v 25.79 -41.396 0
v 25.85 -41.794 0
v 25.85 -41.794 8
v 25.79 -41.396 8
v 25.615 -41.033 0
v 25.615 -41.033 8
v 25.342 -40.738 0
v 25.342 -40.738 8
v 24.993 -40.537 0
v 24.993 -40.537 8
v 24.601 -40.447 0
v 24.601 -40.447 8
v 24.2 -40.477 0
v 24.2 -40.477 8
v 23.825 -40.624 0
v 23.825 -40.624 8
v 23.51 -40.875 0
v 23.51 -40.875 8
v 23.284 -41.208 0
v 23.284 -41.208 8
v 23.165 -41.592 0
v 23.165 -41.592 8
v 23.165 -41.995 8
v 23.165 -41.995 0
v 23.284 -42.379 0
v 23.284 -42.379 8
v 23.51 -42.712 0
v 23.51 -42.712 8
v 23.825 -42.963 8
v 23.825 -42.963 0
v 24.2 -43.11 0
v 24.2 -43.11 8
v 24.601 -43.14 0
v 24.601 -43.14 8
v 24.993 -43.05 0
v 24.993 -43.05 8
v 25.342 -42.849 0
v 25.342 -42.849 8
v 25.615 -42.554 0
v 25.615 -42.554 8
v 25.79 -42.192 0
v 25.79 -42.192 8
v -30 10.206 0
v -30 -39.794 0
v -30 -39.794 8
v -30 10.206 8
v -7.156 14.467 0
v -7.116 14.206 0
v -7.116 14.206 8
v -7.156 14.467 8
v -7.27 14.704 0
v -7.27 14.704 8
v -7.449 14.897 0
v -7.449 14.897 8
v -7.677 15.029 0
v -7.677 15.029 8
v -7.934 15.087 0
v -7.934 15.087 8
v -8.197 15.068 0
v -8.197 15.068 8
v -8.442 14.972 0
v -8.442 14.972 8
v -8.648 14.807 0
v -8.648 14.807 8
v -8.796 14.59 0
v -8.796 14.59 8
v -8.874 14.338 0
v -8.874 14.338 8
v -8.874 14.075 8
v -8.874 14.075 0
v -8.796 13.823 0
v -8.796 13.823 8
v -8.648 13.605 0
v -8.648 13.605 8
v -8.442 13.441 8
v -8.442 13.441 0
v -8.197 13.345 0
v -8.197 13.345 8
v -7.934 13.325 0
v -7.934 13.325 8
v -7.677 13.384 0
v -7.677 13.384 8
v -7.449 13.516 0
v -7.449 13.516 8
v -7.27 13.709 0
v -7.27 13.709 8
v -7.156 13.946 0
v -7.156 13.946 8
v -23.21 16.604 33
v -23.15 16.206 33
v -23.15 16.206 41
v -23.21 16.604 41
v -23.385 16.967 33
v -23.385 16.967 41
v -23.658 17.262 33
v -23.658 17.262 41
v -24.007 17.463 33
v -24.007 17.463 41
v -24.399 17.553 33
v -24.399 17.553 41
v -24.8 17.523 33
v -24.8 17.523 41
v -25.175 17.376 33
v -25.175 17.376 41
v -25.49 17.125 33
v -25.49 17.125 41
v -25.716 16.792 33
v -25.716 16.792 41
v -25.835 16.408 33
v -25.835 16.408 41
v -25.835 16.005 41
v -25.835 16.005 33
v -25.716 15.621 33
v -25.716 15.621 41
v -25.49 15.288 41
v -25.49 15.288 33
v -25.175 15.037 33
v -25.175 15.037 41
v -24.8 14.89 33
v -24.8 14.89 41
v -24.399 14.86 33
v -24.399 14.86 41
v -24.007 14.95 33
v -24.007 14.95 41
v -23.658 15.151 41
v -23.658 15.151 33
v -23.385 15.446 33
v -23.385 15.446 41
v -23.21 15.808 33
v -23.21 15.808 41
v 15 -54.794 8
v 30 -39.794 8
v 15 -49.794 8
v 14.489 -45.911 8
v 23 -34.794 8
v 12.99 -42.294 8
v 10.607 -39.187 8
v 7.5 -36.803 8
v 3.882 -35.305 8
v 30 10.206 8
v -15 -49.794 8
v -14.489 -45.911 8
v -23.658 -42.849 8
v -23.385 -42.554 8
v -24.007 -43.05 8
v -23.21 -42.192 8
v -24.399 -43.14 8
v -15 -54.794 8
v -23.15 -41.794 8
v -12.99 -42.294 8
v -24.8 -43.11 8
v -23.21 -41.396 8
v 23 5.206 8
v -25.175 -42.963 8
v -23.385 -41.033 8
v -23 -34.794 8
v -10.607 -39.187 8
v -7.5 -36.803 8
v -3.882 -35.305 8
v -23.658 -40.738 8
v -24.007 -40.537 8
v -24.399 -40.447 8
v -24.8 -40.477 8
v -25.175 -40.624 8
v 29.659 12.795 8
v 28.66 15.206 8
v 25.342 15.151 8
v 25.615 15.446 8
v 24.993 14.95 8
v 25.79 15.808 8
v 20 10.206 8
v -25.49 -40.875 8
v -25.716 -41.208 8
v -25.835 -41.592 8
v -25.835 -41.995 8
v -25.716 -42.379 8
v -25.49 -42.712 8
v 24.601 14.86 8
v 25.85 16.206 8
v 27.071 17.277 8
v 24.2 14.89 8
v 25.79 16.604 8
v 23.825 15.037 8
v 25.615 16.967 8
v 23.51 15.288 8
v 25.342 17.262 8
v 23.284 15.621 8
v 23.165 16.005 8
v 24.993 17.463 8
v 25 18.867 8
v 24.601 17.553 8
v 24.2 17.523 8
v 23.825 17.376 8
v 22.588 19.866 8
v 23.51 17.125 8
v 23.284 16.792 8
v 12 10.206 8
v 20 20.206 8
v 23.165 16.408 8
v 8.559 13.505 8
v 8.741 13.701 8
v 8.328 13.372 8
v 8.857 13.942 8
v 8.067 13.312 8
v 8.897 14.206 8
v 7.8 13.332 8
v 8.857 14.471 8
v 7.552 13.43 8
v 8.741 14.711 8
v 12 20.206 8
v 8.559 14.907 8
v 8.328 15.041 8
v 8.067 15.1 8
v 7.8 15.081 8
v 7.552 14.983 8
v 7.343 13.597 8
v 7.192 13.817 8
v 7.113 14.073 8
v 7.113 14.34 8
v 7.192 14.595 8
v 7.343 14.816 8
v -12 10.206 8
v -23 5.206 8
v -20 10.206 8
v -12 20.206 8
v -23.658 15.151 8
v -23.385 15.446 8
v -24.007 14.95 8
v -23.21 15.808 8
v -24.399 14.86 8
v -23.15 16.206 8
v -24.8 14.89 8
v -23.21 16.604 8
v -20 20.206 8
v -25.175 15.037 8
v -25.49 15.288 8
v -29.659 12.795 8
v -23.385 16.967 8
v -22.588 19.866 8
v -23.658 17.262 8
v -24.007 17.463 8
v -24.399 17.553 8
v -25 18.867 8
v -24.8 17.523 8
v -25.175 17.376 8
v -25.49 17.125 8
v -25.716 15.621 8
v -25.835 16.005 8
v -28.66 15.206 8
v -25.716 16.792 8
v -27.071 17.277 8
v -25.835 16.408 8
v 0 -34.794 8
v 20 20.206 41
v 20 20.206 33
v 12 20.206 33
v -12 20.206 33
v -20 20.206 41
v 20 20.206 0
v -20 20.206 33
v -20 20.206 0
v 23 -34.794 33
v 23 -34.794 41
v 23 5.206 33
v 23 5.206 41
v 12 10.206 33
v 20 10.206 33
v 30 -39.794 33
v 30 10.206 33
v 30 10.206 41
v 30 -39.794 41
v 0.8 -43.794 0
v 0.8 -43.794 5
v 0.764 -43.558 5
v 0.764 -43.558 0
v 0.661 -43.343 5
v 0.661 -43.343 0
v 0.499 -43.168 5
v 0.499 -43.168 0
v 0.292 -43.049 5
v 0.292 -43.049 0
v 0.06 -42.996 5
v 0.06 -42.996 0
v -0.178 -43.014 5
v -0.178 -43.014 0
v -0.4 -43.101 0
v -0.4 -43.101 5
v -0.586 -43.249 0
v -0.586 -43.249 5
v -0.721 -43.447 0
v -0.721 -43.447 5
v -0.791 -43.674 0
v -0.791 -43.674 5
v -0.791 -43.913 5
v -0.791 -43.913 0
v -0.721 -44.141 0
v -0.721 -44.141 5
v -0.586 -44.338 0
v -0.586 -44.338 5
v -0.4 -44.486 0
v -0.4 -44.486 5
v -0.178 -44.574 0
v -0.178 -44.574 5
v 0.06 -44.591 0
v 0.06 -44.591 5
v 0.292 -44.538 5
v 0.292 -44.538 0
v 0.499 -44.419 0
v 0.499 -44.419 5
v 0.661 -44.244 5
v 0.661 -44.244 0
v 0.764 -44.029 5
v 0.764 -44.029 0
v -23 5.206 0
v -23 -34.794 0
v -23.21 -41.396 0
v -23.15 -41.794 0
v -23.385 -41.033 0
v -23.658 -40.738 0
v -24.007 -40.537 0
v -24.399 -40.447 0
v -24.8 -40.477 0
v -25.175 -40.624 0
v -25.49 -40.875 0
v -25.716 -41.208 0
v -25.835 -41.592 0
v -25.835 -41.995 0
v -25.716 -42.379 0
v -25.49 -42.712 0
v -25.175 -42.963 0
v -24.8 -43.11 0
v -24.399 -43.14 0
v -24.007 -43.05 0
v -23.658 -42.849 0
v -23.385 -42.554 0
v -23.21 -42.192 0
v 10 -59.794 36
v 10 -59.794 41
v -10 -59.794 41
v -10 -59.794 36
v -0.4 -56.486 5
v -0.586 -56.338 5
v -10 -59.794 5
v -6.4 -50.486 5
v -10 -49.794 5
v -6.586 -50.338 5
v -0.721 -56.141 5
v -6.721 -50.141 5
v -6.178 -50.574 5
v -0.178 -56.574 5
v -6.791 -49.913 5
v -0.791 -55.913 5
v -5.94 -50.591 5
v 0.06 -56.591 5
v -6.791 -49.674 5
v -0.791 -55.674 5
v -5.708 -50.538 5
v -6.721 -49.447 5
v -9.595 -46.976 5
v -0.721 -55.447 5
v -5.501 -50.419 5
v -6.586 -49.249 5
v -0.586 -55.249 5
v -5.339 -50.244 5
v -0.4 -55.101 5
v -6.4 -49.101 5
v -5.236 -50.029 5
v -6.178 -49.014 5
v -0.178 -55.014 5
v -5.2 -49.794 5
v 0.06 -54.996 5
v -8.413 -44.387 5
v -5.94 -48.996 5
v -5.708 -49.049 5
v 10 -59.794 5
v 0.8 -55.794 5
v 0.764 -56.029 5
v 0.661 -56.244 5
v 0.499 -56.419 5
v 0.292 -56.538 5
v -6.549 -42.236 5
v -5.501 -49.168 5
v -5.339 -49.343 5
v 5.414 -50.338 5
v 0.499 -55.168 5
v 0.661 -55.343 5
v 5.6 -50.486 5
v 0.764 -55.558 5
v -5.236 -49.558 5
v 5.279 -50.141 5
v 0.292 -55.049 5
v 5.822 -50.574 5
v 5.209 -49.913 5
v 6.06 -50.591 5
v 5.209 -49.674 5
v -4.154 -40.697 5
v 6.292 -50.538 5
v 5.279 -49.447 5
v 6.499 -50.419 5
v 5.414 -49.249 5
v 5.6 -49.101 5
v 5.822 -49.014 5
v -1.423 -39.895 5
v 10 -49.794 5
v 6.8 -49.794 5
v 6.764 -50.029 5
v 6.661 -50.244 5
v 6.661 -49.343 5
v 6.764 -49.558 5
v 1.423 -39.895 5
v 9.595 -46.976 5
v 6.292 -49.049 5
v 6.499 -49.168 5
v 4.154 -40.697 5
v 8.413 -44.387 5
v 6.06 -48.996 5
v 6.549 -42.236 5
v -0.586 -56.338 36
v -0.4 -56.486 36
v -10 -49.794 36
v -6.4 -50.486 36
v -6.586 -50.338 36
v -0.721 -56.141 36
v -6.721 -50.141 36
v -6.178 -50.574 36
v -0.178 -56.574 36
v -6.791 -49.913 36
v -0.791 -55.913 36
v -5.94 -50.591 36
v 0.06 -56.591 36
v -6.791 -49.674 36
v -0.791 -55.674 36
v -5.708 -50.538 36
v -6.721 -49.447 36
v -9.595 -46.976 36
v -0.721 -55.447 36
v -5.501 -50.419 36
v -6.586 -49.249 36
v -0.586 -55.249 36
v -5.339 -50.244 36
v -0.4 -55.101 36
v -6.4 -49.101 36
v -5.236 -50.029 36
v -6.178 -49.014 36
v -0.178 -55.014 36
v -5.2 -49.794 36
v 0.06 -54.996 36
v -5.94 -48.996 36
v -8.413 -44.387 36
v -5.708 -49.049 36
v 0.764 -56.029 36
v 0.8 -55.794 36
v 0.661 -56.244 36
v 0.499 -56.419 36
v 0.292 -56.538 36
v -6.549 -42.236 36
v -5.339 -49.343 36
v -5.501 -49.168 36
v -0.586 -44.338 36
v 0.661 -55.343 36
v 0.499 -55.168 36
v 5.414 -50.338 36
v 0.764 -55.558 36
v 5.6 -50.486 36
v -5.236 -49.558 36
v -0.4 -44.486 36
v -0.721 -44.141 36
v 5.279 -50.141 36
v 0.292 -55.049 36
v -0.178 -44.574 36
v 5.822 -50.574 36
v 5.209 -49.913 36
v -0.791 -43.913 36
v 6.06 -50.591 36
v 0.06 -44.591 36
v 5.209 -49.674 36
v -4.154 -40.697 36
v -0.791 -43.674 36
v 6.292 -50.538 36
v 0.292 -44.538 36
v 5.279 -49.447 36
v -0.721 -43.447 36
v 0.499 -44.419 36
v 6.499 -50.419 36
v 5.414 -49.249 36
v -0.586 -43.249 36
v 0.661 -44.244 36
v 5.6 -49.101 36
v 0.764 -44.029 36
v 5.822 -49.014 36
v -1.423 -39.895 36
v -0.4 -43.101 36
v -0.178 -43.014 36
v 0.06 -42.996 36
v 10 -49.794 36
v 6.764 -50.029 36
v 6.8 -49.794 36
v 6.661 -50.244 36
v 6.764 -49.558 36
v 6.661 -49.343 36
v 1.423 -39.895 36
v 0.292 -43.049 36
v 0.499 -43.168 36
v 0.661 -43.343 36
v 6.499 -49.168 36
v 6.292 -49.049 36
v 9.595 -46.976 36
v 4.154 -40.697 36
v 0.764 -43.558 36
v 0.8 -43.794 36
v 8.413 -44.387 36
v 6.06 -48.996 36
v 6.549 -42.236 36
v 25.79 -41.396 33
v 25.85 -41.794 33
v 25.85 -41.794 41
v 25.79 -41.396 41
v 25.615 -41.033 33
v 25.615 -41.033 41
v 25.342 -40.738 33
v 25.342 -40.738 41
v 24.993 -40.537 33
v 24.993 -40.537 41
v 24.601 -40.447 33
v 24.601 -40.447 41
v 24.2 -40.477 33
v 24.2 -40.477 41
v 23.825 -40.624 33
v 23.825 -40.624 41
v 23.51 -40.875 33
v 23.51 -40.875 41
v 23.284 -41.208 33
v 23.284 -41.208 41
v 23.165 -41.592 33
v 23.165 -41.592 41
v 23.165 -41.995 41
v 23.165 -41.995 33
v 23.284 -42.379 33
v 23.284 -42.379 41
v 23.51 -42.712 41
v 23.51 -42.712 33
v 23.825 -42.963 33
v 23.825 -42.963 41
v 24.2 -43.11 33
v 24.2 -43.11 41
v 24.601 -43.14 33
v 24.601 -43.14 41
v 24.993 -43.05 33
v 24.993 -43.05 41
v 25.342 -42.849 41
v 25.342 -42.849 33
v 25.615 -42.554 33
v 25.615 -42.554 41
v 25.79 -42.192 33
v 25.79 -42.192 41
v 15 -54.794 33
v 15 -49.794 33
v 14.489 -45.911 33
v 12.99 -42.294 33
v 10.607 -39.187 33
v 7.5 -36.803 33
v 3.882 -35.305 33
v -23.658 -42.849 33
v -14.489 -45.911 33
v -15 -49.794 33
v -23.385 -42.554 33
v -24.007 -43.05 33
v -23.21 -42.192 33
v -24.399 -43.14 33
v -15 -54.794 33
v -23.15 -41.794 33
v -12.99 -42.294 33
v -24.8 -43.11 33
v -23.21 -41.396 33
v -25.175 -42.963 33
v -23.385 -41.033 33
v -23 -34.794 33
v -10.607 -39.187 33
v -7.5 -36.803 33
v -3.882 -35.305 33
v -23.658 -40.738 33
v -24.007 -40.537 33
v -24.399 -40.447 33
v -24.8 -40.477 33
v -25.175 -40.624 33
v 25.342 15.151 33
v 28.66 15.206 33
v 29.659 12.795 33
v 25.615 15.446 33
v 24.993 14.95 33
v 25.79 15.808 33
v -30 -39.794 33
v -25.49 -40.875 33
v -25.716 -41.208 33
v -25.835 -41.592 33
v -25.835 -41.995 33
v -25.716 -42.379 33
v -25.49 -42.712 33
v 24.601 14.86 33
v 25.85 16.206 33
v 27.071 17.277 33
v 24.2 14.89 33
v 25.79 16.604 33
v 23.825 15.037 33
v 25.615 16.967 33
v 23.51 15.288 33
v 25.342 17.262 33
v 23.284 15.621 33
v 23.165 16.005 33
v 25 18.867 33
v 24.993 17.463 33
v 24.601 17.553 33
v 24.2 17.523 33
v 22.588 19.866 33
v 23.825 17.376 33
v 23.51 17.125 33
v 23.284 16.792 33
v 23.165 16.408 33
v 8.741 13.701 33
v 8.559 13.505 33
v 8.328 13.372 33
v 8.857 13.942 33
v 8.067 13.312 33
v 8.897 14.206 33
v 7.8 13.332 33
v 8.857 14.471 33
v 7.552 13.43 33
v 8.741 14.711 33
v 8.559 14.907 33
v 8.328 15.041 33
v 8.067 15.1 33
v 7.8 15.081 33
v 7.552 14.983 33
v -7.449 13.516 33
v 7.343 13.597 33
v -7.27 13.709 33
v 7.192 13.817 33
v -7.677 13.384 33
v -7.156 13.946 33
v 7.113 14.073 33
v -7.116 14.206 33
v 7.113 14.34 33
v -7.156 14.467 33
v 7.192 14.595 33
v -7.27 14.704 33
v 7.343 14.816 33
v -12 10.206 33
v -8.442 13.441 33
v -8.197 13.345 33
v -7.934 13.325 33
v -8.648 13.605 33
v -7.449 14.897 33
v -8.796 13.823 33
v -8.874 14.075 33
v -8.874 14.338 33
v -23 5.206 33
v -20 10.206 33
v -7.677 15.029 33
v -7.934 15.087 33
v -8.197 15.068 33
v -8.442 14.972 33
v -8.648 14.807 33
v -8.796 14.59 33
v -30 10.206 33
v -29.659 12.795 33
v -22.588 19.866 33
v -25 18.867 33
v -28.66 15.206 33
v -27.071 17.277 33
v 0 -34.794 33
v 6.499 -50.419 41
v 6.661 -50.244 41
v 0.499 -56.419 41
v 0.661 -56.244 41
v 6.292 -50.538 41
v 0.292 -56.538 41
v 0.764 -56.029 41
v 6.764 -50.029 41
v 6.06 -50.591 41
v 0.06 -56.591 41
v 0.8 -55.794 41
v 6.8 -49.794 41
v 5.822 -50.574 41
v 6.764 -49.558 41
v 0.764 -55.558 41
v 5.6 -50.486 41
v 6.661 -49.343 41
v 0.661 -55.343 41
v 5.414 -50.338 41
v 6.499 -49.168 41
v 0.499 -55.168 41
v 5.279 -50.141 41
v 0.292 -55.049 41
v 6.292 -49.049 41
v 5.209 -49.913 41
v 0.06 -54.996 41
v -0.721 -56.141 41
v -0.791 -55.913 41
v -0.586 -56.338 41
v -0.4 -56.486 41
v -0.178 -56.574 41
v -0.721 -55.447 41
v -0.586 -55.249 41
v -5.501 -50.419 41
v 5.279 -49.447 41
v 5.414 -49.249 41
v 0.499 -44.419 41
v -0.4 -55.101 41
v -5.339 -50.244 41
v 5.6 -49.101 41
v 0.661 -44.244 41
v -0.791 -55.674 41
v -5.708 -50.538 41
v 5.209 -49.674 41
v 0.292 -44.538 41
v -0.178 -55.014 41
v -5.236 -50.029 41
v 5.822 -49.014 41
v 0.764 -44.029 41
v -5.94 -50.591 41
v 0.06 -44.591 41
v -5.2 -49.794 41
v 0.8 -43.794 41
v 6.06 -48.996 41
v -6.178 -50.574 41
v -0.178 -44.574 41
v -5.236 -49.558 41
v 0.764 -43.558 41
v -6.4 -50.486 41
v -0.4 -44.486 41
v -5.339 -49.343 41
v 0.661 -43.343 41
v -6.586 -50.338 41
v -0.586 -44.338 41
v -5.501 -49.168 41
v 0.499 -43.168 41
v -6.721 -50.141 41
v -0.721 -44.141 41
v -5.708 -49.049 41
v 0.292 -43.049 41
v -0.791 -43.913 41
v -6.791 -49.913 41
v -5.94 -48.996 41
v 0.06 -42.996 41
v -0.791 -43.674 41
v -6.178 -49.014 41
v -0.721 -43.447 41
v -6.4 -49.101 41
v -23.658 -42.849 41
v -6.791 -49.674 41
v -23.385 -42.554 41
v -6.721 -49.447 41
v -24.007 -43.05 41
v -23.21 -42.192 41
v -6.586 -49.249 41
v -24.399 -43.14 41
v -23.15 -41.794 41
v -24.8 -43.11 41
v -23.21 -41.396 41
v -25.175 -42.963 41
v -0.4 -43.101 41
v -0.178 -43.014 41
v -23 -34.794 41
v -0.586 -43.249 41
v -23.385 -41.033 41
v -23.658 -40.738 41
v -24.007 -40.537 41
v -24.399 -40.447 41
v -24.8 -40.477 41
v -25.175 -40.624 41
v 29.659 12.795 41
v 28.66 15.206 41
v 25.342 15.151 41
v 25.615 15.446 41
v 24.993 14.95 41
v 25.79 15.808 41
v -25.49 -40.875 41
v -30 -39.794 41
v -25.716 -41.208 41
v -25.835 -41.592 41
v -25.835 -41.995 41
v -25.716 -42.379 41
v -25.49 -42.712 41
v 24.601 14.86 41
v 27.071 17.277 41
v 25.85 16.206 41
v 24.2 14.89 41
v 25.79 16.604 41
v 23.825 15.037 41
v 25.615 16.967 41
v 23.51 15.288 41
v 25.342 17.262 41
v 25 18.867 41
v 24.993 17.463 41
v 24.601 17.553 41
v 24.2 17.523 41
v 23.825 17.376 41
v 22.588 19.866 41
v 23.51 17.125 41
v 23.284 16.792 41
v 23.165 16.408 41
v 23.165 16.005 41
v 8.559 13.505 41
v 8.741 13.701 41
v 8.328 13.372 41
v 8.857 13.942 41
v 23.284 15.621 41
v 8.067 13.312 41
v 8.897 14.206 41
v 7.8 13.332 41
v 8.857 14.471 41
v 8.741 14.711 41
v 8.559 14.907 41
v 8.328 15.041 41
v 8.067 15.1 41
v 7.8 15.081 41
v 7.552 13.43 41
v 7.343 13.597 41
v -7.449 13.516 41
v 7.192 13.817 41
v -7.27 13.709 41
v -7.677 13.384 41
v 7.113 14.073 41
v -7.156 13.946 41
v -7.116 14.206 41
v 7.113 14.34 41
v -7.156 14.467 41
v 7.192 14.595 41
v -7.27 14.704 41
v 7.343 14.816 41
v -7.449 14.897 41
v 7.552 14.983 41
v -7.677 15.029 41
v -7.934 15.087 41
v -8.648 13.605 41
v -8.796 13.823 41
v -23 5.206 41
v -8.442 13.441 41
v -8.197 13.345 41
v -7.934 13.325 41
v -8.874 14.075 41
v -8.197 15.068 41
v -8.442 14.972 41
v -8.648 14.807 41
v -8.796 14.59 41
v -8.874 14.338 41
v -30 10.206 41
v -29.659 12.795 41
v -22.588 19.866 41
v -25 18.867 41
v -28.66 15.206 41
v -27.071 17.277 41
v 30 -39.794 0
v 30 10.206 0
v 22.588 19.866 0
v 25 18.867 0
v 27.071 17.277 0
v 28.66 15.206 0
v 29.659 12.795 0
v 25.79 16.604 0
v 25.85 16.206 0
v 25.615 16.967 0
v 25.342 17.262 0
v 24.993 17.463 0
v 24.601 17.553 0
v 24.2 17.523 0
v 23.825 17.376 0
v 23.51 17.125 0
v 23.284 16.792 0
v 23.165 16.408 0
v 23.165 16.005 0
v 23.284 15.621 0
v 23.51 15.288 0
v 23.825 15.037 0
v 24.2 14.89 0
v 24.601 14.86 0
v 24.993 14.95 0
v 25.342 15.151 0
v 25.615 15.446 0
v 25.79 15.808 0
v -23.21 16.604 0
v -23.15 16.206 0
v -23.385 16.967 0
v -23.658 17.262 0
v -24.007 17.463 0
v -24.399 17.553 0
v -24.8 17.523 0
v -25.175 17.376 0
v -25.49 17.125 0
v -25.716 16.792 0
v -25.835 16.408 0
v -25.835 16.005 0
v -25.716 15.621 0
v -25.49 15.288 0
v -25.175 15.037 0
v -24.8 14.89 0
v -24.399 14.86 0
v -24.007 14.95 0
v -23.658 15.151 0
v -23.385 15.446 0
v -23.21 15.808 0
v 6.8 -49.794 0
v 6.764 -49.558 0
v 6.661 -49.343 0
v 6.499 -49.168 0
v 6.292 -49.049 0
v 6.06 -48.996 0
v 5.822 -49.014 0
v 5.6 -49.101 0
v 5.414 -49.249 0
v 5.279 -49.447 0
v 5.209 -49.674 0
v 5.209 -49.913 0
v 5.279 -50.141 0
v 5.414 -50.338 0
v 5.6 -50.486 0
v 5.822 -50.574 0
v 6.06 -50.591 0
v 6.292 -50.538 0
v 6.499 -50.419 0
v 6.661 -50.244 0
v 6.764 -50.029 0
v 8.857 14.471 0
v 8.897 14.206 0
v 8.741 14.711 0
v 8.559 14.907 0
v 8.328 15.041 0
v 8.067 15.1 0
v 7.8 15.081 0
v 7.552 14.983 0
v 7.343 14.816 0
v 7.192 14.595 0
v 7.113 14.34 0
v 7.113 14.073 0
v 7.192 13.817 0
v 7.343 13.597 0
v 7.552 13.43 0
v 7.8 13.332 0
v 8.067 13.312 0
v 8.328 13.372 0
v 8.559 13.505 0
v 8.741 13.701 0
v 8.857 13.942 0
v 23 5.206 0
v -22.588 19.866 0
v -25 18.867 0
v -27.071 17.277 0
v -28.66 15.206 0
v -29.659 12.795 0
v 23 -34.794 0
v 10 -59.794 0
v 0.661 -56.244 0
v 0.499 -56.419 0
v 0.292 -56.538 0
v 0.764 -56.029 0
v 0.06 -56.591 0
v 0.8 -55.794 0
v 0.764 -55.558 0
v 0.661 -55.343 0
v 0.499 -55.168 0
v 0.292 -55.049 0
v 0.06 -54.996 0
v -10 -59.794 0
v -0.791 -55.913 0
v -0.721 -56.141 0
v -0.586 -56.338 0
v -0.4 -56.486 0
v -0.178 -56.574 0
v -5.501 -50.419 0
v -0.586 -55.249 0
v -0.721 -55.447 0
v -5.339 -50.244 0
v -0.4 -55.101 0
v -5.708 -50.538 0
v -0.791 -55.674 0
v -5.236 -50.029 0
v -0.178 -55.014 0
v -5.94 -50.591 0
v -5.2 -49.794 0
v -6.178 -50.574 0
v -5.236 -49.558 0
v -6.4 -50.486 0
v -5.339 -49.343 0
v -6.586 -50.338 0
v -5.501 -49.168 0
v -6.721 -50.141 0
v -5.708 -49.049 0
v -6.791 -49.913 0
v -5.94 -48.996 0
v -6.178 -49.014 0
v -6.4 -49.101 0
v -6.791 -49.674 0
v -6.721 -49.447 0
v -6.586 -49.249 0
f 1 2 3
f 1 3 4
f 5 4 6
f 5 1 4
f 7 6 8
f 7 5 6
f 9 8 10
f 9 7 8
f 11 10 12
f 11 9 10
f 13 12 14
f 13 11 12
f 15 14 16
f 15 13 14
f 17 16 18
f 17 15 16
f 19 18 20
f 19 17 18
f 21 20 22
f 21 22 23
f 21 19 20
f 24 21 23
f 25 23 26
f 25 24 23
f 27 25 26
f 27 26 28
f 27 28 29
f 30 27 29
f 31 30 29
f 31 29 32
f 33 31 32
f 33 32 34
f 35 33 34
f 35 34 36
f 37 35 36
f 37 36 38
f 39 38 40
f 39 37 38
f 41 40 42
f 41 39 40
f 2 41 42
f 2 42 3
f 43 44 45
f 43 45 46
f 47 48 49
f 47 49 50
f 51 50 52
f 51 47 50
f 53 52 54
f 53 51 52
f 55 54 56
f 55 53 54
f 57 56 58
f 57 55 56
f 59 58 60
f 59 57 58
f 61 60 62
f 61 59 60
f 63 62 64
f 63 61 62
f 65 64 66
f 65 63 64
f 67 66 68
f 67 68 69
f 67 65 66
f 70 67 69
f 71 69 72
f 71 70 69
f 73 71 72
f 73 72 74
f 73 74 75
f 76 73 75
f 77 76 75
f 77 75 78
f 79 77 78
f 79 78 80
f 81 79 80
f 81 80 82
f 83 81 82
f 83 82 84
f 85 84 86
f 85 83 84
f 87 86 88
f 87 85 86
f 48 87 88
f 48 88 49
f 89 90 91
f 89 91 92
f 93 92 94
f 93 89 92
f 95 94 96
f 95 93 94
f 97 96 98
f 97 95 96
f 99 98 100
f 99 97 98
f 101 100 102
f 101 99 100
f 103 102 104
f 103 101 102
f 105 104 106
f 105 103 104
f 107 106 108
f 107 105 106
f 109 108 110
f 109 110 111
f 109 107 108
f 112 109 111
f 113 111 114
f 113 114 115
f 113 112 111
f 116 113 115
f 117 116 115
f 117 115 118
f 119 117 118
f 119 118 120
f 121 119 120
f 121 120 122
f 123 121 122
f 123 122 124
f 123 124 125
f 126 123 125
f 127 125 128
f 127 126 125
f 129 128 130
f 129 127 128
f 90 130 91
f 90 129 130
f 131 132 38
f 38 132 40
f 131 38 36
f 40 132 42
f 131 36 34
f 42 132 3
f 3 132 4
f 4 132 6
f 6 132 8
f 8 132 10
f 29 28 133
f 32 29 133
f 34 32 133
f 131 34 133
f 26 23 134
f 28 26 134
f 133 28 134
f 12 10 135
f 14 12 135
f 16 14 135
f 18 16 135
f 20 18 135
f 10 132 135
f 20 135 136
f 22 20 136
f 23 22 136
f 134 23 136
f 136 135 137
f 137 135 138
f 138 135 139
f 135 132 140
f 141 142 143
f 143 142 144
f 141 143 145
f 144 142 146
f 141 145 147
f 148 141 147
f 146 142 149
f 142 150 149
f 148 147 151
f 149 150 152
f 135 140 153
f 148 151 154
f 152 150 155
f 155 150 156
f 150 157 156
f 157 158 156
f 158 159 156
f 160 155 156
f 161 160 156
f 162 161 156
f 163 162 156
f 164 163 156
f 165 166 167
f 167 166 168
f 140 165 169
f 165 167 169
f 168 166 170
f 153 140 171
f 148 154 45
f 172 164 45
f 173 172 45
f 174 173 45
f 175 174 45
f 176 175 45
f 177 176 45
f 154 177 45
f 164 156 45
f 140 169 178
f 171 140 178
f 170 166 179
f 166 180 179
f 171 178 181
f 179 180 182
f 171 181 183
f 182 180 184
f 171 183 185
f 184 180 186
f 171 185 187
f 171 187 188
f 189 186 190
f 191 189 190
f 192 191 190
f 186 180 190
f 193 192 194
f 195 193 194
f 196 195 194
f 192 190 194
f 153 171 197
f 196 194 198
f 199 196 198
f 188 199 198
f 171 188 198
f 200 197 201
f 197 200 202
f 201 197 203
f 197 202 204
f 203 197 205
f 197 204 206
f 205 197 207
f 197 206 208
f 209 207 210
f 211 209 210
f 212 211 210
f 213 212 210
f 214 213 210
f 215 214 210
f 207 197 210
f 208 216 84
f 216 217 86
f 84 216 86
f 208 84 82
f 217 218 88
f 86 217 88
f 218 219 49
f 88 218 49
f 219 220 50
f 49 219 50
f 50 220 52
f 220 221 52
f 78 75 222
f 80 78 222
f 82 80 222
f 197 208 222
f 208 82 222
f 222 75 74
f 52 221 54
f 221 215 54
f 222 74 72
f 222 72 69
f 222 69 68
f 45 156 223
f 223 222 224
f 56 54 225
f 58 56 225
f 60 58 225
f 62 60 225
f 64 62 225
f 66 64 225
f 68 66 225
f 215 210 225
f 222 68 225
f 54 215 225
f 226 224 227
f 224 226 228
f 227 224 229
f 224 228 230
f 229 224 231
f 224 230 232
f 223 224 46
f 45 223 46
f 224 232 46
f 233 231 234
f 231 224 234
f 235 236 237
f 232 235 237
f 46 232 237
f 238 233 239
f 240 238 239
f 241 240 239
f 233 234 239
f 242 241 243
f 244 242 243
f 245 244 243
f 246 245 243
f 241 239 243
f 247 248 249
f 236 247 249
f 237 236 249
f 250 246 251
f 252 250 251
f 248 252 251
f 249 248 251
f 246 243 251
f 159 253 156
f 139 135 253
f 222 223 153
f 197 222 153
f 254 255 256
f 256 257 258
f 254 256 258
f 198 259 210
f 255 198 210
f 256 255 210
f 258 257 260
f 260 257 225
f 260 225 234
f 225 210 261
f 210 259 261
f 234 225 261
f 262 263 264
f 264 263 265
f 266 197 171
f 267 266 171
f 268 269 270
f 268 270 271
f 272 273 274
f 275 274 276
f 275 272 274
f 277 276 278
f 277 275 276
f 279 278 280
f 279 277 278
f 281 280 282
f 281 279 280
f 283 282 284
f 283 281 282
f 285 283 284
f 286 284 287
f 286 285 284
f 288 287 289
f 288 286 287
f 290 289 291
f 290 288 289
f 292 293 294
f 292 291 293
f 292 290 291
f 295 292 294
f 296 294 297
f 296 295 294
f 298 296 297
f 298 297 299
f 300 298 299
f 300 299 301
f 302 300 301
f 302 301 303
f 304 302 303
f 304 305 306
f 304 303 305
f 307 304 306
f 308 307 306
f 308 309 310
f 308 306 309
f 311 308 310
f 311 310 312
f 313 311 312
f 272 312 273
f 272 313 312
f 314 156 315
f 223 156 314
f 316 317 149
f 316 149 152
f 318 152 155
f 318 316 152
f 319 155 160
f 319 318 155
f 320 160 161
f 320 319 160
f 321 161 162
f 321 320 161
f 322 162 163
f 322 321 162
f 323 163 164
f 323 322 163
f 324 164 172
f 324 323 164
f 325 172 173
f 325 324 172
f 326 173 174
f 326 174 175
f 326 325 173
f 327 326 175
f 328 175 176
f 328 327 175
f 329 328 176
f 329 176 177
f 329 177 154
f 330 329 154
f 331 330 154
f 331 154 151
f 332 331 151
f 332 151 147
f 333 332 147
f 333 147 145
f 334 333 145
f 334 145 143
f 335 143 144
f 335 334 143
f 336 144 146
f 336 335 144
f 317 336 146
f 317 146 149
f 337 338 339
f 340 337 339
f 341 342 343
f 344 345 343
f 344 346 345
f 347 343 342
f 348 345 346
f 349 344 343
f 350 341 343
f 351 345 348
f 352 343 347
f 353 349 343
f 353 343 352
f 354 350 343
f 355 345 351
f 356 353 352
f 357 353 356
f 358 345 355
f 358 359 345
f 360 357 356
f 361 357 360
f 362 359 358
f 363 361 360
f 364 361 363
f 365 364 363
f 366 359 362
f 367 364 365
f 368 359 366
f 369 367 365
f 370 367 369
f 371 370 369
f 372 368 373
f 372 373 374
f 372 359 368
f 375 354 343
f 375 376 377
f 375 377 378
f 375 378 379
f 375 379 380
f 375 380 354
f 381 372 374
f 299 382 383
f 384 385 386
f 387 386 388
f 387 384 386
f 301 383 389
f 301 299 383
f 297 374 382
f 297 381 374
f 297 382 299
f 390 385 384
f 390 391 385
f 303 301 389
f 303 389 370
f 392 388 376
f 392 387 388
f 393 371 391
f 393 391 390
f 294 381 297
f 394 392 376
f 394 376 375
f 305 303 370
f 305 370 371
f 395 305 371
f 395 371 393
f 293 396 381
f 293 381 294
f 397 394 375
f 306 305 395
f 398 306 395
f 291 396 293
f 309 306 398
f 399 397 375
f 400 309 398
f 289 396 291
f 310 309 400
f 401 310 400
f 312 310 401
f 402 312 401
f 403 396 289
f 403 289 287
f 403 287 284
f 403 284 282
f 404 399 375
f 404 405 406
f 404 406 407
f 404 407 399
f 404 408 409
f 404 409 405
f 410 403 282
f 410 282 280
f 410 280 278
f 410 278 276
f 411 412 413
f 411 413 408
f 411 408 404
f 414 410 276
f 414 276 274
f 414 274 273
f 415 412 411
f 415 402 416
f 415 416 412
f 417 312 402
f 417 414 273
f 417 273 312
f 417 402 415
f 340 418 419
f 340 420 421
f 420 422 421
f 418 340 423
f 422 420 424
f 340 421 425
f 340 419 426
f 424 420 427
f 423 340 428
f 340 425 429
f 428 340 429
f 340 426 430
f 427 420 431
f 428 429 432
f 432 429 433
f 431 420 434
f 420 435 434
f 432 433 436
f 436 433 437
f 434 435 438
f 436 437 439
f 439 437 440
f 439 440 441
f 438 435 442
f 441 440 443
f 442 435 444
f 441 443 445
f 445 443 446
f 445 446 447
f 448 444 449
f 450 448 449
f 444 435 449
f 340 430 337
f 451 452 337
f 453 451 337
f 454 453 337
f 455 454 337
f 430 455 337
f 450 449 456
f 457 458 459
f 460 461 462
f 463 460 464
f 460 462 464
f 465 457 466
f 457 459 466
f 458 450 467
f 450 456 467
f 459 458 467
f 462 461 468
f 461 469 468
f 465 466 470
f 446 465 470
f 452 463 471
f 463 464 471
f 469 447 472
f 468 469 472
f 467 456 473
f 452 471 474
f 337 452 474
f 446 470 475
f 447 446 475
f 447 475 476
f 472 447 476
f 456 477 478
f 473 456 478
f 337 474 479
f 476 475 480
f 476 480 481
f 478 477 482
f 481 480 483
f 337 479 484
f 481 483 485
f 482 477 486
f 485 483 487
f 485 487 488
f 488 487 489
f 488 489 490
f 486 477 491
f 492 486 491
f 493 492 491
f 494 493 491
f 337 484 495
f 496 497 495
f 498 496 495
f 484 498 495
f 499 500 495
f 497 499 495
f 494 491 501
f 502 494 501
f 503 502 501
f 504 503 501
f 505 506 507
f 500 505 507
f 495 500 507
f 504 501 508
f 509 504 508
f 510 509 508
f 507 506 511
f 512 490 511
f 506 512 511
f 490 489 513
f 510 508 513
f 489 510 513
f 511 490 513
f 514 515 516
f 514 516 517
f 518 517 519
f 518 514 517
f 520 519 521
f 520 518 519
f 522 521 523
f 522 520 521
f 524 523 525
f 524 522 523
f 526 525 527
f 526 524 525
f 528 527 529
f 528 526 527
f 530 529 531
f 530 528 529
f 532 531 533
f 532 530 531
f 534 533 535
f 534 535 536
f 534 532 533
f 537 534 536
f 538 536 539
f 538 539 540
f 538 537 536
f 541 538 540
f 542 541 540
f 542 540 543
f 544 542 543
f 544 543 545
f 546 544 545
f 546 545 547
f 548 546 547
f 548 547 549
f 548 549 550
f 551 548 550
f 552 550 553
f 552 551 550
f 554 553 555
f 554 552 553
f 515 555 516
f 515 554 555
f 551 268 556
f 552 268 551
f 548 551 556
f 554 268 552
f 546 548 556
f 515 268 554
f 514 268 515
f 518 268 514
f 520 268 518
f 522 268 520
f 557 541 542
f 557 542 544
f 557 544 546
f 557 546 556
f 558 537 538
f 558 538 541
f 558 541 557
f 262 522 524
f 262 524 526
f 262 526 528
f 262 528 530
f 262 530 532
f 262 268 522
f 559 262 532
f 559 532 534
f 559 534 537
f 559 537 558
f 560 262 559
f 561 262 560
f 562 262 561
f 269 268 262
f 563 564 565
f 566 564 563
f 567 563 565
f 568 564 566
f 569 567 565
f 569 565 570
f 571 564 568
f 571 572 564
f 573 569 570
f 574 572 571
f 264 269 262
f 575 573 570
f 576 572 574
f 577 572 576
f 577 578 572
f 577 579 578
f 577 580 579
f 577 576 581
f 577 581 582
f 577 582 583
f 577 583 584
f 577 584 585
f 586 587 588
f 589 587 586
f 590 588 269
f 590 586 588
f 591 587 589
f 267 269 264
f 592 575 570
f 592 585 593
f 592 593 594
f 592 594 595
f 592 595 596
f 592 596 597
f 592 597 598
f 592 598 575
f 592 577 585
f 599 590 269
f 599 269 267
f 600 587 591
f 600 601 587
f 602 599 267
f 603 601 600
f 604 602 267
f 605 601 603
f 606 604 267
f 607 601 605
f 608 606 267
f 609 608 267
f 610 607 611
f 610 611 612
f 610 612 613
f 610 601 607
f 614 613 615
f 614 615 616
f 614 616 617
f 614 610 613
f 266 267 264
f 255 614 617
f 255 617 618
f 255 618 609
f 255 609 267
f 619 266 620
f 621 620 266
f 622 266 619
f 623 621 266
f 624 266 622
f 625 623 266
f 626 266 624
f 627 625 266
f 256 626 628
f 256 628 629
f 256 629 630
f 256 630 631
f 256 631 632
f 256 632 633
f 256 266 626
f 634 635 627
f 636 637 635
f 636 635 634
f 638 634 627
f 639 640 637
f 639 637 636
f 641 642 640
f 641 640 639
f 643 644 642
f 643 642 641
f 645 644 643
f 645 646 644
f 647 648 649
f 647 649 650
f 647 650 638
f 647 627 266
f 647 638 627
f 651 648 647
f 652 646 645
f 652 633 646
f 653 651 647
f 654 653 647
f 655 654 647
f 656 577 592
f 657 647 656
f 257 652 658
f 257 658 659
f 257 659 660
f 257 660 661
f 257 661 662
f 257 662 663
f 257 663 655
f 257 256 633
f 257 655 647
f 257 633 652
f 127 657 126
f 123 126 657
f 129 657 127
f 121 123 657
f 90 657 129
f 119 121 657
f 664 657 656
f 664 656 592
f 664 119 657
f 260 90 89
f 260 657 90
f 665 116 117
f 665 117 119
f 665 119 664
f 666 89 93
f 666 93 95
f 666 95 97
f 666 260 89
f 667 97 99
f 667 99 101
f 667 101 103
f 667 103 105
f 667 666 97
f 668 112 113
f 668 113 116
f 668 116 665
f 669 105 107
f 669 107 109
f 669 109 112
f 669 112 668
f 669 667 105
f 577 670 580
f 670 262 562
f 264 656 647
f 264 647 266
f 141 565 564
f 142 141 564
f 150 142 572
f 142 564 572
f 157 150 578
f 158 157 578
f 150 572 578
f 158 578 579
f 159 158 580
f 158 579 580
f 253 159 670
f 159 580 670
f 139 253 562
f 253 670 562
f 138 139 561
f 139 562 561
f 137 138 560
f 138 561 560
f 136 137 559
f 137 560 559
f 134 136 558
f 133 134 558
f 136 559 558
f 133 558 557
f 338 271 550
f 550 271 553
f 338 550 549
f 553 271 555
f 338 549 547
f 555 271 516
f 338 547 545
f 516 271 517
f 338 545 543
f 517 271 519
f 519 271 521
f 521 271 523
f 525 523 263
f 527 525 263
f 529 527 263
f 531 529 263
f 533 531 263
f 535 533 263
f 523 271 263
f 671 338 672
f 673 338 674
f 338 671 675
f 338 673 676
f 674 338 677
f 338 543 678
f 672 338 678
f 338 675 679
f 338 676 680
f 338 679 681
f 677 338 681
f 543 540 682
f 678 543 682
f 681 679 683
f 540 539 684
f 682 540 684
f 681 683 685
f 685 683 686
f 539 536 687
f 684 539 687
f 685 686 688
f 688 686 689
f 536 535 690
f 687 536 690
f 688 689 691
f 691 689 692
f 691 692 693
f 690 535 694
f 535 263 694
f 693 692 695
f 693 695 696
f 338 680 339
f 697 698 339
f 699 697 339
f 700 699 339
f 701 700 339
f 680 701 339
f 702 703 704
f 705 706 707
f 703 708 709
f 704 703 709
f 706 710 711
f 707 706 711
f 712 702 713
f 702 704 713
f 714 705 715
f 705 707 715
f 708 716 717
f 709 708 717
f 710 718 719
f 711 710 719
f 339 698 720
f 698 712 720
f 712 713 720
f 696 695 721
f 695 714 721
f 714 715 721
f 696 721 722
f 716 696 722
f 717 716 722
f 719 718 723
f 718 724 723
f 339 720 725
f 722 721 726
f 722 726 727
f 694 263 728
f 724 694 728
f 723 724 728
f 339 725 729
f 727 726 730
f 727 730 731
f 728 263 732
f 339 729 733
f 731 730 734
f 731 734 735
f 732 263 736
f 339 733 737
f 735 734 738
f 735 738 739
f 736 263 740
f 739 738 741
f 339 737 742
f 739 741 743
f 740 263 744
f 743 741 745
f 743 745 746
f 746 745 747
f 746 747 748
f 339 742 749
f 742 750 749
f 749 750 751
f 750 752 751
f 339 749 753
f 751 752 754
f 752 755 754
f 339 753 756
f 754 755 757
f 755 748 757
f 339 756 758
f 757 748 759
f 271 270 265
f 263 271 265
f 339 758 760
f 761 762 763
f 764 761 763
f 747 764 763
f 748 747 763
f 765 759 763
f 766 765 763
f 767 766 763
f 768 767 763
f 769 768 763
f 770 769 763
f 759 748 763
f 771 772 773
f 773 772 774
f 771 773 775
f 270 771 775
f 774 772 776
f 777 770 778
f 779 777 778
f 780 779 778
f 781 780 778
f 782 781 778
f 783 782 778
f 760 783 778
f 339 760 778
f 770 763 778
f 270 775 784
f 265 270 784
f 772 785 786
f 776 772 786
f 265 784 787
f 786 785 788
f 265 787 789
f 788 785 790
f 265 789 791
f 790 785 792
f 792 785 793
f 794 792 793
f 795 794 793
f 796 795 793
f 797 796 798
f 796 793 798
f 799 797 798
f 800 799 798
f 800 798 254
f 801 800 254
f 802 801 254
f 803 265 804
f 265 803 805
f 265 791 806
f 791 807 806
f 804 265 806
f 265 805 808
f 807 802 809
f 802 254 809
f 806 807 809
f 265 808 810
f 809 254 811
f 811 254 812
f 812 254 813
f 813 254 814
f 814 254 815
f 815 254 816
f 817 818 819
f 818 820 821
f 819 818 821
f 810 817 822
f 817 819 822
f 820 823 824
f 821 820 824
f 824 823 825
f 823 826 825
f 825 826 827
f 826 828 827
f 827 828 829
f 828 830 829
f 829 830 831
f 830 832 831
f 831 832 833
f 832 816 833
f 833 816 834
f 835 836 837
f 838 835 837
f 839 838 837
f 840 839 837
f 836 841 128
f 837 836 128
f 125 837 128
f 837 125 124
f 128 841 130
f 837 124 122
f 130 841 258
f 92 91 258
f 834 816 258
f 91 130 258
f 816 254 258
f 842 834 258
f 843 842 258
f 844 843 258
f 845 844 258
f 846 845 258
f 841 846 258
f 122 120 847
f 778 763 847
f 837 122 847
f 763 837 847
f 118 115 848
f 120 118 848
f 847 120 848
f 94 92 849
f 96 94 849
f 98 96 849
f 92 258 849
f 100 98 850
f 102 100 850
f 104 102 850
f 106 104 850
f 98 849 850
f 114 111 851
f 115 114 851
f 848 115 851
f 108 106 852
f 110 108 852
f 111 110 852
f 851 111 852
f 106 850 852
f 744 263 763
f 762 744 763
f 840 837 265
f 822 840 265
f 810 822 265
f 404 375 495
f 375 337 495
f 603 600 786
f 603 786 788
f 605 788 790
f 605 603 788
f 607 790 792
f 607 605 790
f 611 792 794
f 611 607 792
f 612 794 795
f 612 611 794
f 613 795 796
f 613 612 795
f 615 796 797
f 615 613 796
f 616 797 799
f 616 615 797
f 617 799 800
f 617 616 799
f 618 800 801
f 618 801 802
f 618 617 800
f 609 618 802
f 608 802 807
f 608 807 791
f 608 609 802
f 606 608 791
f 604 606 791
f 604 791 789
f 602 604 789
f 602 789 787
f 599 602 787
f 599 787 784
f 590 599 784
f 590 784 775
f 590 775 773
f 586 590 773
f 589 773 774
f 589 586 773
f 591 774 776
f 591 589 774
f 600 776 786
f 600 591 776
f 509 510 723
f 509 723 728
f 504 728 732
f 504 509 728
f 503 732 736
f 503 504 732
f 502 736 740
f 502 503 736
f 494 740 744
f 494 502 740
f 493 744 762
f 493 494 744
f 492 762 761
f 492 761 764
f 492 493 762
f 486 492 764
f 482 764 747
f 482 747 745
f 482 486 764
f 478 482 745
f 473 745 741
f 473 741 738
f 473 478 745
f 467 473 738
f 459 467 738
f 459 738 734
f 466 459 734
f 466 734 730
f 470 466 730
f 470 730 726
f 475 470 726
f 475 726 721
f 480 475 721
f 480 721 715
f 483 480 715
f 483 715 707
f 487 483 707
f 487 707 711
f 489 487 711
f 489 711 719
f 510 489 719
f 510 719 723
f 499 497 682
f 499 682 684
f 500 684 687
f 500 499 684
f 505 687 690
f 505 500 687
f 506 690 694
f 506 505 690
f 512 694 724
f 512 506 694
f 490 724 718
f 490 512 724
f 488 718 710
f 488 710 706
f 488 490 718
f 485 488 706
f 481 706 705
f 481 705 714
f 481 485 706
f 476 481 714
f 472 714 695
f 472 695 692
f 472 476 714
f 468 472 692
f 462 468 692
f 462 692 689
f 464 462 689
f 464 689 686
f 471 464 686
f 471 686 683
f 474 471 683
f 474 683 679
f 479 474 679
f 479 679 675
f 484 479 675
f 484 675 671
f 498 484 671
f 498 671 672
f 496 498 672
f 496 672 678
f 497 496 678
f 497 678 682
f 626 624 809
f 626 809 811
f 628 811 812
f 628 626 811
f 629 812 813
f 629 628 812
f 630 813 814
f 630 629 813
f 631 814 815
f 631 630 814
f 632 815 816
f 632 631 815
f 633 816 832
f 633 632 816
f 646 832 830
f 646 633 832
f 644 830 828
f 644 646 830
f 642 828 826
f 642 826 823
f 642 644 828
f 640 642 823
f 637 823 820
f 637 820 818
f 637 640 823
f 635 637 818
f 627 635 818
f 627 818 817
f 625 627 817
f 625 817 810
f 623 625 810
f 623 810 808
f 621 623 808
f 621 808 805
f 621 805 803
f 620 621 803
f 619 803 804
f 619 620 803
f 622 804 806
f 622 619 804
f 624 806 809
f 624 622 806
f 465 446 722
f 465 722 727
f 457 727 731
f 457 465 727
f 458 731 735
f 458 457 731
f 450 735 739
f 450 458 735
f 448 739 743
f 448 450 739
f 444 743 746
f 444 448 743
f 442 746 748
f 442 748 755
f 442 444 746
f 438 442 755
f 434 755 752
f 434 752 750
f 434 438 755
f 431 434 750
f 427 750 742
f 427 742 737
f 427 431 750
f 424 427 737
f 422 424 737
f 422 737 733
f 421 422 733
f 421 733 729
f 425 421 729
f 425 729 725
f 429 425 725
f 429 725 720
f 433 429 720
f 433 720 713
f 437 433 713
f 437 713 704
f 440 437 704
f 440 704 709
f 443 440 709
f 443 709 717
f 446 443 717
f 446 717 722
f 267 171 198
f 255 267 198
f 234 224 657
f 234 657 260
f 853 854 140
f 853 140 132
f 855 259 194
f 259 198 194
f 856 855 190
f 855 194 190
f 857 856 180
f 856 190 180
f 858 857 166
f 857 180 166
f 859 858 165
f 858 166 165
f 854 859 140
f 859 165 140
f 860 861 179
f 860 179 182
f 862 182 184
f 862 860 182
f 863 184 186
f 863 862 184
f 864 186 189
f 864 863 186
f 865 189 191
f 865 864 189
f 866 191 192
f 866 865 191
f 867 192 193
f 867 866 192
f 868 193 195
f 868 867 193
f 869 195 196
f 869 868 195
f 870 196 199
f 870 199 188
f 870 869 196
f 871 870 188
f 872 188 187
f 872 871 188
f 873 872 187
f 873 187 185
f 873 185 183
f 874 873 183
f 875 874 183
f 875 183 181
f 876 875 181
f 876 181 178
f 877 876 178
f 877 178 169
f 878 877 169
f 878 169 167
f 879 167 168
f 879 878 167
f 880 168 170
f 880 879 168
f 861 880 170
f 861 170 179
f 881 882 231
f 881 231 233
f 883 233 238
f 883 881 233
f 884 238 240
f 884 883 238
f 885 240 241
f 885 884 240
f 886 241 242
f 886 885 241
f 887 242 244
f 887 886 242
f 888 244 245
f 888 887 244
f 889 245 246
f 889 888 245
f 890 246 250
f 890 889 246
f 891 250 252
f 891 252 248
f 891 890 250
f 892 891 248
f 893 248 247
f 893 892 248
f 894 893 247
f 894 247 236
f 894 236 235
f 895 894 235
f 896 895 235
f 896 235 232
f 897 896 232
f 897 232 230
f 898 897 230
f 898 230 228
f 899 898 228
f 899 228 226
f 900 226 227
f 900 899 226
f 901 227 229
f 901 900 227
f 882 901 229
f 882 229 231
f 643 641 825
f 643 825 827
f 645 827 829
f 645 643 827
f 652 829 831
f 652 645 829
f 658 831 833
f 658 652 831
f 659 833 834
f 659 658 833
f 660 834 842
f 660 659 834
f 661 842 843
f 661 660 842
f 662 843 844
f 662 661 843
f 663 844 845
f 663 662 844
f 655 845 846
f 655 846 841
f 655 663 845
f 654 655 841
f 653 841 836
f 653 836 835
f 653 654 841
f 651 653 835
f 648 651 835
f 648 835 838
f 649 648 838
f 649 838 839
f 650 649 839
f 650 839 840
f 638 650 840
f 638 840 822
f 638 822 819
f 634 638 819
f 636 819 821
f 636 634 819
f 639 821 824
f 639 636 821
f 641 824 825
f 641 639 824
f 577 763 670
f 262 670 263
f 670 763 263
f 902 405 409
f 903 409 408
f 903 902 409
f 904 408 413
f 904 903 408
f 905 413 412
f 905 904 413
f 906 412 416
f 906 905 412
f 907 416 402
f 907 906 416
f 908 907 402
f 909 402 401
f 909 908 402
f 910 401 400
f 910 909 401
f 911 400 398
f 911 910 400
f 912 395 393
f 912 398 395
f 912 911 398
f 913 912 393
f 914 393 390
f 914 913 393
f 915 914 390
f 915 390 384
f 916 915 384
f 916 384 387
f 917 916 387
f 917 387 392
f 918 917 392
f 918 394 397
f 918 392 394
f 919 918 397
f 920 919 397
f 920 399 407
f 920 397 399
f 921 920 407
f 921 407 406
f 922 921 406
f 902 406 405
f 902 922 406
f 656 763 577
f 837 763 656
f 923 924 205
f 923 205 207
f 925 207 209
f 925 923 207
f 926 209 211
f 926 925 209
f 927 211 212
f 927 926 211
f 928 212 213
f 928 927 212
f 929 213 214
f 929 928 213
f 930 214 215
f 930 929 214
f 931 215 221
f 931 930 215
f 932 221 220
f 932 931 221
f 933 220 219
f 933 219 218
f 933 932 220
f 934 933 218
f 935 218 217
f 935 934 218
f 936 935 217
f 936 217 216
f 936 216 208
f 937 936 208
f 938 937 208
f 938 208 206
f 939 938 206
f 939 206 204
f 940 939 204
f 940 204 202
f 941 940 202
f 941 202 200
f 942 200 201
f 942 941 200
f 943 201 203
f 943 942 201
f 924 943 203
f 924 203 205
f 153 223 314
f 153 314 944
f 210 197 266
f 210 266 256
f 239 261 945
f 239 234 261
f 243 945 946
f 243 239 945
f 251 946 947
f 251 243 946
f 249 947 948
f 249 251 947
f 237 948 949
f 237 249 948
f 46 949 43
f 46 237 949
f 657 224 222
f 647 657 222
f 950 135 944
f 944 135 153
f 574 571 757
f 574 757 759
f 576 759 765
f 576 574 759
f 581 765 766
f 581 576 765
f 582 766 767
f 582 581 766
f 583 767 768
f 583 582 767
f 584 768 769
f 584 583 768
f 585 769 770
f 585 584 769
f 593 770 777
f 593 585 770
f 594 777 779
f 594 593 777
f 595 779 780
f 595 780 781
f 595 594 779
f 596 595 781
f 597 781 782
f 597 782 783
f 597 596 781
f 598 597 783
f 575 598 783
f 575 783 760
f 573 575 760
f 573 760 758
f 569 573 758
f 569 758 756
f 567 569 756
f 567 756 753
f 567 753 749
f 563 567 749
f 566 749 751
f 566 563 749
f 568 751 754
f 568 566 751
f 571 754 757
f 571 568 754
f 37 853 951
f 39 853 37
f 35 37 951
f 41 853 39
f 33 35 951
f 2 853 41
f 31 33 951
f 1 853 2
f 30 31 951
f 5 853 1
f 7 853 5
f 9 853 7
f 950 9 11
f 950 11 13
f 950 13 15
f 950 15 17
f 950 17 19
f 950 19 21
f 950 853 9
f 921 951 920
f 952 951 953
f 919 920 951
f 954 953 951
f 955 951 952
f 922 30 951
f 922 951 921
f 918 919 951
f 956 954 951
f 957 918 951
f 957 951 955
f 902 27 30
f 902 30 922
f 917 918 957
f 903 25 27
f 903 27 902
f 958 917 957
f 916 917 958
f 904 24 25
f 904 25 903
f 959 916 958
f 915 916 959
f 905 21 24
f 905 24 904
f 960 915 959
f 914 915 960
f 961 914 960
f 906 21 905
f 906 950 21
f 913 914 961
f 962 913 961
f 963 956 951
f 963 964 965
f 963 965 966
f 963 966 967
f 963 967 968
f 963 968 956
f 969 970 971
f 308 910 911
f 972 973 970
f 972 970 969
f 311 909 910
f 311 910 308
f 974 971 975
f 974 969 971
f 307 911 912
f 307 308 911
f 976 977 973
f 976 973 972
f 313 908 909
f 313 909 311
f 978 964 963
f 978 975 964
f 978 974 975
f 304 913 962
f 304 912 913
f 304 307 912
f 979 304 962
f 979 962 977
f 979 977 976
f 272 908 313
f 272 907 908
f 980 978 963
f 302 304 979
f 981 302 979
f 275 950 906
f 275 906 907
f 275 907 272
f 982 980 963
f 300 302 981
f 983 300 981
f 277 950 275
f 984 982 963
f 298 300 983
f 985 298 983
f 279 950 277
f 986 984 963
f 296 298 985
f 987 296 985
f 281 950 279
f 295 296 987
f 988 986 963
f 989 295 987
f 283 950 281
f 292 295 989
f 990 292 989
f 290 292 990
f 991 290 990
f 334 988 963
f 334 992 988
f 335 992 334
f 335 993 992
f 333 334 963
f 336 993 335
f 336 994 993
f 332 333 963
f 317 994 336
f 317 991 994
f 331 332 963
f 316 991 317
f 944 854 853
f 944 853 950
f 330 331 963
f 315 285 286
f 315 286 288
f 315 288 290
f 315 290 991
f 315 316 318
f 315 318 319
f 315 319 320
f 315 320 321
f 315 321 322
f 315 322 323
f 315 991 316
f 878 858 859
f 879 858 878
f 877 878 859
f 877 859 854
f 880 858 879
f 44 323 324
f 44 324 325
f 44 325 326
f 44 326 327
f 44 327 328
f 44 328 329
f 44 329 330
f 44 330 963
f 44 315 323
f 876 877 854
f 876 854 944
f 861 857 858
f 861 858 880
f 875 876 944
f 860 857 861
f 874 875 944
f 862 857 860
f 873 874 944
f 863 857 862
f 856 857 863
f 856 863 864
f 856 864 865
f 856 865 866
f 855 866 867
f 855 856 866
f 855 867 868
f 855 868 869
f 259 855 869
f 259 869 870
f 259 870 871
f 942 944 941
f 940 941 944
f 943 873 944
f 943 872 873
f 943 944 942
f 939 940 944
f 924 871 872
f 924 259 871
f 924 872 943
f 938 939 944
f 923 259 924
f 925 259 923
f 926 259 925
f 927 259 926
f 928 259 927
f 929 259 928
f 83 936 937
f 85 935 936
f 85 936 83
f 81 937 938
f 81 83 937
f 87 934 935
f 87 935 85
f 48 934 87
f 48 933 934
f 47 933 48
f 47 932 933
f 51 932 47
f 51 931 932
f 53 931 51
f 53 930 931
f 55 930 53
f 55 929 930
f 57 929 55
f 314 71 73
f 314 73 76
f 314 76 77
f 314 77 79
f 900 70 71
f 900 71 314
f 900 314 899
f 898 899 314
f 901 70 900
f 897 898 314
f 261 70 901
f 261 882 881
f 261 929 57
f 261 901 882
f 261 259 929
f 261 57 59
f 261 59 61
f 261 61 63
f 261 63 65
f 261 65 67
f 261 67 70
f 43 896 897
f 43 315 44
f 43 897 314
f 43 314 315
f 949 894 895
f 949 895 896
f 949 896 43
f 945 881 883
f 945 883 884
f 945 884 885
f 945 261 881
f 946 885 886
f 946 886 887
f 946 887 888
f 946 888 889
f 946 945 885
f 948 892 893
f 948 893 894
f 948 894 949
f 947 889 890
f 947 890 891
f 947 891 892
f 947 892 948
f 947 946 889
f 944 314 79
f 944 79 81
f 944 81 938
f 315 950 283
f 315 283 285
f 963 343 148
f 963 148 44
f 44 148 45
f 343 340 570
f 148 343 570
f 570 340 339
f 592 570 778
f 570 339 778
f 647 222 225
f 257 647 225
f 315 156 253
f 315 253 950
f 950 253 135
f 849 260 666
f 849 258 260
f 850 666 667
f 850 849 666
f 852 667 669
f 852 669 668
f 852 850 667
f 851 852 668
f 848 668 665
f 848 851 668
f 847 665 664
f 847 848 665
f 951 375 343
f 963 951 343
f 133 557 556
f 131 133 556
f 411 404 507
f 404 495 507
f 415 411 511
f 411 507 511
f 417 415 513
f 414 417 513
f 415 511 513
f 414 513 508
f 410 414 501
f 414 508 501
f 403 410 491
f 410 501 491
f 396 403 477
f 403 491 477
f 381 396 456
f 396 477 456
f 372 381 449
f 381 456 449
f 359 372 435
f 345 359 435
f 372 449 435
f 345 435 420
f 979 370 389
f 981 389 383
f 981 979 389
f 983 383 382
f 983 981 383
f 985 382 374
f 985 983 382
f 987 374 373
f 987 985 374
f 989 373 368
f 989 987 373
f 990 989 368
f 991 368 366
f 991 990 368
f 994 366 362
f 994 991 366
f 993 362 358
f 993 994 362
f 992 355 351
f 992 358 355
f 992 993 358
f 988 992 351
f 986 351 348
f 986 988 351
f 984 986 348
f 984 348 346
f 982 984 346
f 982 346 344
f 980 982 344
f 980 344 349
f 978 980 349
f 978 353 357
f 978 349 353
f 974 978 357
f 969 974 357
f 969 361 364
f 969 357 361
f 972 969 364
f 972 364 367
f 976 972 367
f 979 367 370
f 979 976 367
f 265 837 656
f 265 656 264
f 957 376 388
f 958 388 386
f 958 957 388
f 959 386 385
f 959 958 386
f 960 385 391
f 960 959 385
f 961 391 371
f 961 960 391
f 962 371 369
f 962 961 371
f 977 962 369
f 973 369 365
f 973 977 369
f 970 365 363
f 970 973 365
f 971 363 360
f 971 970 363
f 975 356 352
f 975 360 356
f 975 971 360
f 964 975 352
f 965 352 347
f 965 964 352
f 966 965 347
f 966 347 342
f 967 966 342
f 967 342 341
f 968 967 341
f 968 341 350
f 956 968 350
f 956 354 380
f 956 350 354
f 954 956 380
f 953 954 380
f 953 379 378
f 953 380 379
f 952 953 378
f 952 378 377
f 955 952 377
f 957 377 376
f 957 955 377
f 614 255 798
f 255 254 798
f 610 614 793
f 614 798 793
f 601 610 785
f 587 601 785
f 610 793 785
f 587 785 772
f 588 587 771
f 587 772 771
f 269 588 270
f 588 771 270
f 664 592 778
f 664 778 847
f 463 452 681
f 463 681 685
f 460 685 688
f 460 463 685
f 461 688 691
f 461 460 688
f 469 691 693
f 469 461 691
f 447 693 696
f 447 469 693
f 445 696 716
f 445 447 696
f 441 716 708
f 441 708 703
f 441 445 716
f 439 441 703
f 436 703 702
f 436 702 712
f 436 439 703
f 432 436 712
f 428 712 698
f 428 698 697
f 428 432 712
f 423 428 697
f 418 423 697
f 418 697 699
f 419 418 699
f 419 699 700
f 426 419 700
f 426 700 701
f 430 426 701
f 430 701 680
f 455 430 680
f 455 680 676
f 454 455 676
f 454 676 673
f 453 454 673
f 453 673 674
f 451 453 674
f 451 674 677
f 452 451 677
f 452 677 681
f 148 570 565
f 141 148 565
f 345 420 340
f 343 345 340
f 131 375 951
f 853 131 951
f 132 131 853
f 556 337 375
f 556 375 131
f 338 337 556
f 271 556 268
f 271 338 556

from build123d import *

# Parameters (mm, degrees)
SKETCH1_R           = 0.883567379
SKETCH1_R_2         = 0.896609669
SKETCH1_R_3         = 0.8
SKETCH1_R_4         = 1.35
BOSS_EXTRUDE1_DEPTH = 8
SKETCH2_W           = 8
SKETCH2_H           = 10
BOSS_EXTRUDE3_DEPTH = 25
BOSS_EXTRUDE4_START = 33
SKETCH1_2_R         = 0.883567379
SKETCH1_2_R_2       = 0.896609669
SKETCH1_2_R_3       = 0.8
SKETCH1_2_R_4       = 1.35
BOSS_EXTRUDE4_DEPTH = 8
CUT_EXTRUDE1_DEPTH  = 3
CUT_EXTRUDE2_START  = 28
CUT_EXTRUDE2_DEPTH  = 3
BOSS_EXTRUDE5_DEPTH = 25
CUT_EXTRUDE3_DEPTH  = 41
FILLET5_R           = 10
SKETCH8_W           = 46
SKETCH8_H           = 40
CUT_EXTRUDE4_DEPTH  = 79.4619407


with BuildPart() as part:
    # Sketch1 → Boss-Extrude1 (new body)
    with BuildSketch(Plane.XY):
        Polygon((-30, 20.206387144), (0, 20.206387144), (30, 20.206387144), (30, -59.793612856), (-30, -59.793612856), align=None)
        with Locations((-8, 14.206387144)):
            Circle(SKETCH1_R, mode=Mode.SUBTRACT)
        with Locations((8, 14.206387144)):
            Circle(SKETCH1_R_2, mode=Mode.SUBTRACT)
        with Locations((0, -43.793612856)):
            Circle(SKETCH1_R_3, mode=Mode.SUBTRACT)
        with Locations((6, -49.793612856)):
            Circle(SKETCH1_R_3, mode=Mode.SUBTRACT)
        with Locations((0, -55.793612856)):
            Circle(SKETCH1_R_3, mode=Mode.SUBTRACT)
        with Locations((-6, -49.793612856)):
            Circle(SKETCH1_R_3, mode=Mode.SUBTRACT)
        with Locations((-24.5, 16.206387144)):
            Circle(SKETCH1_R_4, mode=Mode.SUBTRACT)
        with Locations((24.5, 16.206387144)):
            Circle(SKETCH1_R_4, mode=Mode.SUBTRACT)
        with Locations((-24.5, -41.793612856)):
            Circle(SKETCH1_R_4, mode=Mode.SUBTRACT)
        with Locations((24.5, -41.793612856)):
            Circle(SKETCH1_R_4, mode=Mode.SUBTRACT)
    extrude(amount=BOSS_EXTRUDE1_DEPTH)

    # Sketch2 → Boss-Extrude3 (add)
    with BuildSketch(Plane.XY.offset(8)):
        with Locations((-16, 15.206387144)):
            Rectangle(SKETCH2_W, SKETCH2_H)
        with Locations((16, 15.206387144)):
            Rectangle(SKETCH2_W, SKETCH2_H)
    extrude(amount=BOSS_EXTRUDE3_DEPTH)

    # Sketch1<2> → Boss-Extrude4 (add)
    with BuildSketch(Plane.XY.offset(BOSS_EXTRUDE4_START)):
        Polygon((-30, 20.206387144), (0, 20.206387144), (30, 20.206387144), (30, -59.793612856), (-30, -59.793612856), align=None)
        with Locations((-8, 14.206387144)):
            Circle(SKETCH1_2_R, mode=Mode.SUBTRACT)
        with Locations((8, 14.206387144)):
            Circle(SKETCH1_2_R_2, mode=Mode.SUBTRACT)
        with Locations((0, -43.793612856)):
            Circle(SKETCH1_2_R_3, mode=Mode.SUBTRACT)
        with Locations((6, -49.793612856)):
            Circle(SKETCH1_2_R_3, mode=Mode.SUBTRACT)
        with Locations((0, -55.793612856)):
            Circle(SKETCH1_2_R_3, mode=Mode.SUBTRACT)
        with Locations((-6, -49.793612856)):
            Circle(SKETCH1_2_R_3, mode=Mode.SUBTRACT)
        with Locations((-24.5, 16.206387144)):
            Circle(SKETCH1_2_R_4, mode=Mode.SUBTRACT)
        with Locations((24.5, 16.206387144)):
            Circle(SKETCH1_2_R_4, mode=Mode.SUBTRACT)
        with Locations((-24.5, -41.793612856)):
            Circle(SKETCH1_2_R_4, mode=Mode.SUBTRACT)
        with Locations((24.5, -41.793612856)):
            Circle(SKETCH1_2_R_4, mode=Mode.SUBTRACT)
    extrude(amount=BOSS_EXTRUDE4_DEPTH)

    # Sketch3 → Cut-Extrude1 (cut)
    with BuildSketch(Plane.XY.offset(8)):
        with BuildLine():
            Line((-10, -49.793612856), (-10, -59.793612856))
            Line((-10, -59.793612856), (10, -59.793612856))
            Line((10, -59.793612856), (10, -49.793612856))
            ThreePointArc((10, -49.793612856), (0, -39.793612856), (-10, -49.793612856))
        make_face()
    extrude(amount=-CUT_EXTRUDE1_DEPTH, mode=Mode.SUBTRACT)

    # Sketch3<2> → Cut-Extrude2 (cut)
    with BuildSketch(Plane.XY.offset(8).offset(CUT_EXTRUDE2_START)):
        with BuildLine():
            Line((-10, -49.793612856), (-10, -59.793612856))
            Line((-10, -59.793612856), (10, -59.793612856))
            Line((10, -59.793612856), (10, -49.793612856))
            ThreePointArc((10, -49.793612856), (0, -39.793612856), (-10, -49.793612856))
        make_face()
    extrude(amount=-CUT_EXTRUDE2_DEPTH, mode=Mode.SUBTRACT)

    # Sketch5 → Boss-Extrude5 (add)
    with BuildSketch(Plane(origin=(0, 0, 33), x_dir=(-1, 0, 0), z_dir=(0, 0, -1))):
        with BuildLine():
            Line((-15, -49.793612856), (-15, -59.793612856))
            Line((-15, -59.793612856), (-10, -59.793612856))
            Line((-10, -59.793612856), (-10, -49.793612856))
            ThreePointArc((-10, -49.793612856), (0, -39.793612856), (10, -49.793612856))
            Line((10, -49.793612856), (10, -59.793612856))
            Line((10, -59.793612856), (15, -59.793612856))
            Line((15, -59.793612856), (15, -49.793612856))
            ThreePointArc((15, -49.793612856), (0, -34.793612856), (-15, -49.793612856))
        make_face()
    extrude(amount=BOSS_EXTRUDE5_DEPTH)

    # Sketch7 → Cut-Extrude3 (cut)
    with BuildSketch(Plane.XY.offset(41)):
        Polygon((30, -39.793612856), (30, -59.793612856), (10, -59.793612856), align=None)
        Polygon((-30, -39.793612856), (-30, -59.793612856), (-10, -59.793612856), align=None)
    extrude(amount=-CUT_EXTRUDE3_DEPTH, mode=Mode.SUBTRACT)

    # Fillet5
    fillet5_edges = [part.edges().sort_by_distance(p)[0] for p in [
        (-30, 20.206387144, 37),
        (-30, 20.206387144, 4),
        (30, 20.206387144, 4),
        (30, 20.206387144, 37),
    ]]
    fillet(fillet5_edges, radius=FILLET5_R)

    # Sketch8 → Cut-Extrude4 (cut, through all)
    with BuildSketch(Plane.XY.offset(41)):
        with Locations((0, -14.793612856)):
            Rectangle(SKETCH8_W, SKETCH8_H)
    extrude(amount=-CUT_EXTRUDE4_DEPTH, mode=Mode.SUBTRACT)


solid = part.part
